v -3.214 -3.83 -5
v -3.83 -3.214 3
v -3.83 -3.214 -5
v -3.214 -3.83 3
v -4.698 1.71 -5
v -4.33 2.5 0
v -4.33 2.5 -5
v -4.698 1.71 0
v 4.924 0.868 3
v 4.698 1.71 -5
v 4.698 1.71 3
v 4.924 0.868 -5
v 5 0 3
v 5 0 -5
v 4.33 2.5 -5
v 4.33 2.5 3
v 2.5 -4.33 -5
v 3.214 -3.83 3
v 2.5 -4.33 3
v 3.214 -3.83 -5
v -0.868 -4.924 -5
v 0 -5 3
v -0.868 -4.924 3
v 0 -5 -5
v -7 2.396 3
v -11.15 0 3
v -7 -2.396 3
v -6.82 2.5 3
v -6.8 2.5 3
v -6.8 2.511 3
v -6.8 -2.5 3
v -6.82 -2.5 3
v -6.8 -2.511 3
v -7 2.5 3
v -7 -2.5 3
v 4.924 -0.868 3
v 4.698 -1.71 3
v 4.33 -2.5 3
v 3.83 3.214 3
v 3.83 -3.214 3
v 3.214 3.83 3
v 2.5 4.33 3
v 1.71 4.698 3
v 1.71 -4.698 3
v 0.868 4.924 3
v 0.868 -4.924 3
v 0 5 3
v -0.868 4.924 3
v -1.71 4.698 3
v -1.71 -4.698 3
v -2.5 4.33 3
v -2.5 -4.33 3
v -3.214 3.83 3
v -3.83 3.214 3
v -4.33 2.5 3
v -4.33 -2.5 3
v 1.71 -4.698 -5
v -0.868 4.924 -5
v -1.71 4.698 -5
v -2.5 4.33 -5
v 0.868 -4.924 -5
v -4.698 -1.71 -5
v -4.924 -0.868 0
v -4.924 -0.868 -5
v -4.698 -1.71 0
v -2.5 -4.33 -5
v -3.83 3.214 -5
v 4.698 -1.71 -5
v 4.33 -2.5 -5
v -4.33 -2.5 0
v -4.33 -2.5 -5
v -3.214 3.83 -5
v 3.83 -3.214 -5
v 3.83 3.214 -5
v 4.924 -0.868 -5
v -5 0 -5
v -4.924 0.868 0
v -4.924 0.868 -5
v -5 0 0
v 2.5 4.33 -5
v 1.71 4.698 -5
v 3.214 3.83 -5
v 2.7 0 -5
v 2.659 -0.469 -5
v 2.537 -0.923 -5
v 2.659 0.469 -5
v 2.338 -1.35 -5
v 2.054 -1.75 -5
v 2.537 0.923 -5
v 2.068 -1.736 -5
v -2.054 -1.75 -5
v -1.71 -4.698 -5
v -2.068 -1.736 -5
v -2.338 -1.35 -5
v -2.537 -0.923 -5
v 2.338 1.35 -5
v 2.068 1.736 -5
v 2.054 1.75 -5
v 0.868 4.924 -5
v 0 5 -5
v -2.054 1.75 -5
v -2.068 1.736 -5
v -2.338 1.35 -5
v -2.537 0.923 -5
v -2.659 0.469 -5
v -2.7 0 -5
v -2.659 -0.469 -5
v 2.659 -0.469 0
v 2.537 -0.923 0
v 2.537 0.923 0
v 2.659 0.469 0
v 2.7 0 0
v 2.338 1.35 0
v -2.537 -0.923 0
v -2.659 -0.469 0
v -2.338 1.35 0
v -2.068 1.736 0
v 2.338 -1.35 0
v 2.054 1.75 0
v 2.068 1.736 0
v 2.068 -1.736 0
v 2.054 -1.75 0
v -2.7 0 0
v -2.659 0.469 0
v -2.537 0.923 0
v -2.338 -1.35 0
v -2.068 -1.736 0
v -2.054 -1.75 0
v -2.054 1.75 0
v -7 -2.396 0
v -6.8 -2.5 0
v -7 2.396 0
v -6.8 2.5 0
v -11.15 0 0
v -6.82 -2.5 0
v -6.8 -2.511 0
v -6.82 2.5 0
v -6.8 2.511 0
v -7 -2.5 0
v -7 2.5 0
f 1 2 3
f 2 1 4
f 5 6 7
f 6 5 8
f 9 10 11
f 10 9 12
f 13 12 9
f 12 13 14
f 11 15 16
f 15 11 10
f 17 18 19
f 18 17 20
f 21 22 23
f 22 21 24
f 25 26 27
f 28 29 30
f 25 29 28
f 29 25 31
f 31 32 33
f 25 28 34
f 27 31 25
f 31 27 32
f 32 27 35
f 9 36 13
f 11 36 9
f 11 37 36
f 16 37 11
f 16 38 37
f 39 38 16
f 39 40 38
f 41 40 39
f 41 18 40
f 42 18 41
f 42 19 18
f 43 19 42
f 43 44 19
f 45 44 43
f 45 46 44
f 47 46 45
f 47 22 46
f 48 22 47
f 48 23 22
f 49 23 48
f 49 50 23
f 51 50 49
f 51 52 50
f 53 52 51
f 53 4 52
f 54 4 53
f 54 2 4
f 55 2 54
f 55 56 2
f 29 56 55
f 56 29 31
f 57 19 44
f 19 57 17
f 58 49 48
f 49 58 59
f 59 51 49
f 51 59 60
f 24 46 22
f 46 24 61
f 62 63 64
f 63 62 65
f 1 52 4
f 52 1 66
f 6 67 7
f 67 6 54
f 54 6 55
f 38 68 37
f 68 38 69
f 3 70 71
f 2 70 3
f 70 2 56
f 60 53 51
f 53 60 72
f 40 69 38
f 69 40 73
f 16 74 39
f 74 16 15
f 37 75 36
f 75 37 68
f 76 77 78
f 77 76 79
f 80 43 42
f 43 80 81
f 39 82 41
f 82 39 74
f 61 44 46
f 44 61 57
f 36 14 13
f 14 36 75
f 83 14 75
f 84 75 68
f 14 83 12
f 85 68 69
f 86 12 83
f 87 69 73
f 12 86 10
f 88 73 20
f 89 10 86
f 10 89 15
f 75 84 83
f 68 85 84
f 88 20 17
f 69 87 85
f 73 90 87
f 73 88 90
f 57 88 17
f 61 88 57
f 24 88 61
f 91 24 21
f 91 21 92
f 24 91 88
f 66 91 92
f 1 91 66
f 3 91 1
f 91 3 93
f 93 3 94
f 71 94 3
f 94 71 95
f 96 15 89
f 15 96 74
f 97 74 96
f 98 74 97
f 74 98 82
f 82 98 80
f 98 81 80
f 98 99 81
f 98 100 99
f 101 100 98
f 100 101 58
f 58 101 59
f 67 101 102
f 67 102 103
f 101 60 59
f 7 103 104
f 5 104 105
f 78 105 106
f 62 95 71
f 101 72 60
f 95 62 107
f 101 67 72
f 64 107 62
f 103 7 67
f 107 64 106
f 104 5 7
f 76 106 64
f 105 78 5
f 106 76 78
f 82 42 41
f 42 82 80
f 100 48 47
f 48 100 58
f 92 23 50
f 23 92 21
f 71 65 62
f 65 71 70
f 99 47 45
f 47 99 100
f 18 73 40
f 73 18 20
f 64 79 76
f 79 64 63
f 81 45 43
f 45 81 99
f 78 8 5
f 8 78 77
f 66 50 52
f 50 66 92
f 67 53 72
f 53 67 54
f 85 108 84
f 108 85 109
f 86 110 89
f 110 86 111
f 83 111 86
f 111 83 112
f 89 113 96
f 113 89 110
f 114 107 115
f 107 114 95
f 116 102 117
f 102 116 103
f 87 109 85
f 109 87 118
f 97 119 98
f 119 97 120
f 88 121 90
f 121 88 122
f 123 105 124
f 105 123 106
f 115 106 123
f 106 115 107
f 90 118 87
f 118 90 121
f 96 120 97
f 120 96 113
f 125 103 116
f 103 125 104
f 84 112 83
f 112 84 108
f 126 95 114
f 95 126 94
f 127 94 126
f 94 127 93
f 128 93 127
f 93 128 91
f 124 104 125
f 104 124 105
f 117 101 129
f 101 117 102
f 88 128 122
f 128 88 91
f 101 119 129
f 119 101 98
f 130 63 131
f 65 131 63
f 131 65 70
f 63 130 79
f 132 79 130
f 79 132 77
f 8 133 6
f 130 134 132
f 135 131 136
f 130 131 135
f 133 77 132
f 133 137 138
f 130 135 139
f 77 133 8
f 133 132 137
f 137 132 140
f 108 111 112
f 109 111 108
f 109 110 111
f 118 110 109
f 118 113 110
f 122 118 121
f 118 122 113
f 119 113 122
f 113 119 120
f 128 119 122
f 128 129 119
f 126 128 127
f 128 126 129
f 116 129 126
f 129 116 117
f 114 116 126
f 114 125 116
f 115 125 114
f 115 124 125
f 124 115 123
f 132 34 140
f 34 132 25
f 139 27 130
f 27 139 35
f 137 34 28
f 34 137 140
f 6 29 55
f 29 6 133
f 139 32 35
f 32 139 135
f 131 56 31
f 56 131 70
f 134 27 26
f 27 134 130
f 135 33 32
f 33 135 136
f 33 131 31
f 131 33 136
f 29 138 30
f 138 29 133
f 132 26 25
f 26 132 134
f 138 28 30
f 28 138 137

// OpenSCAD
$fn=36;

hole_height = 5.0;
hole_width = 5.5;
hole_length = 5.4;
hole_radius = hole_length / 2;
arrow_height = 3.0;
full_height = 8.0;

union()
{
    translate([0, 0, -1])
    {
        union()
        {
            difference()
            {
                cylinder(full_height, 5.0, 5.0, true);
                cylinder(full_height + 0.1, hole_radius, hole_radius, true);
            }
            translate([0, -hole_width / 2, 0])
            {
                cube([6.0, 2.0, full_height], true);
            }
            translate([0, hole_width / 2, 0])
            {
                cube([6.0, 2.0, full_height], true);
            }
        }
    }

    translate([-2, 0, 1.5])
    {
        color("Blue")
        cube([10, 5, 3], true);
    }
    
    translate([-8.25, 0, 1.5])
    {
        scale([1.0, 1.0, 1.0])
        color("Green")
        rotate([0,0,180])
        cylinder(3,2.9,2.9,$fn=3, true);
    }
}
